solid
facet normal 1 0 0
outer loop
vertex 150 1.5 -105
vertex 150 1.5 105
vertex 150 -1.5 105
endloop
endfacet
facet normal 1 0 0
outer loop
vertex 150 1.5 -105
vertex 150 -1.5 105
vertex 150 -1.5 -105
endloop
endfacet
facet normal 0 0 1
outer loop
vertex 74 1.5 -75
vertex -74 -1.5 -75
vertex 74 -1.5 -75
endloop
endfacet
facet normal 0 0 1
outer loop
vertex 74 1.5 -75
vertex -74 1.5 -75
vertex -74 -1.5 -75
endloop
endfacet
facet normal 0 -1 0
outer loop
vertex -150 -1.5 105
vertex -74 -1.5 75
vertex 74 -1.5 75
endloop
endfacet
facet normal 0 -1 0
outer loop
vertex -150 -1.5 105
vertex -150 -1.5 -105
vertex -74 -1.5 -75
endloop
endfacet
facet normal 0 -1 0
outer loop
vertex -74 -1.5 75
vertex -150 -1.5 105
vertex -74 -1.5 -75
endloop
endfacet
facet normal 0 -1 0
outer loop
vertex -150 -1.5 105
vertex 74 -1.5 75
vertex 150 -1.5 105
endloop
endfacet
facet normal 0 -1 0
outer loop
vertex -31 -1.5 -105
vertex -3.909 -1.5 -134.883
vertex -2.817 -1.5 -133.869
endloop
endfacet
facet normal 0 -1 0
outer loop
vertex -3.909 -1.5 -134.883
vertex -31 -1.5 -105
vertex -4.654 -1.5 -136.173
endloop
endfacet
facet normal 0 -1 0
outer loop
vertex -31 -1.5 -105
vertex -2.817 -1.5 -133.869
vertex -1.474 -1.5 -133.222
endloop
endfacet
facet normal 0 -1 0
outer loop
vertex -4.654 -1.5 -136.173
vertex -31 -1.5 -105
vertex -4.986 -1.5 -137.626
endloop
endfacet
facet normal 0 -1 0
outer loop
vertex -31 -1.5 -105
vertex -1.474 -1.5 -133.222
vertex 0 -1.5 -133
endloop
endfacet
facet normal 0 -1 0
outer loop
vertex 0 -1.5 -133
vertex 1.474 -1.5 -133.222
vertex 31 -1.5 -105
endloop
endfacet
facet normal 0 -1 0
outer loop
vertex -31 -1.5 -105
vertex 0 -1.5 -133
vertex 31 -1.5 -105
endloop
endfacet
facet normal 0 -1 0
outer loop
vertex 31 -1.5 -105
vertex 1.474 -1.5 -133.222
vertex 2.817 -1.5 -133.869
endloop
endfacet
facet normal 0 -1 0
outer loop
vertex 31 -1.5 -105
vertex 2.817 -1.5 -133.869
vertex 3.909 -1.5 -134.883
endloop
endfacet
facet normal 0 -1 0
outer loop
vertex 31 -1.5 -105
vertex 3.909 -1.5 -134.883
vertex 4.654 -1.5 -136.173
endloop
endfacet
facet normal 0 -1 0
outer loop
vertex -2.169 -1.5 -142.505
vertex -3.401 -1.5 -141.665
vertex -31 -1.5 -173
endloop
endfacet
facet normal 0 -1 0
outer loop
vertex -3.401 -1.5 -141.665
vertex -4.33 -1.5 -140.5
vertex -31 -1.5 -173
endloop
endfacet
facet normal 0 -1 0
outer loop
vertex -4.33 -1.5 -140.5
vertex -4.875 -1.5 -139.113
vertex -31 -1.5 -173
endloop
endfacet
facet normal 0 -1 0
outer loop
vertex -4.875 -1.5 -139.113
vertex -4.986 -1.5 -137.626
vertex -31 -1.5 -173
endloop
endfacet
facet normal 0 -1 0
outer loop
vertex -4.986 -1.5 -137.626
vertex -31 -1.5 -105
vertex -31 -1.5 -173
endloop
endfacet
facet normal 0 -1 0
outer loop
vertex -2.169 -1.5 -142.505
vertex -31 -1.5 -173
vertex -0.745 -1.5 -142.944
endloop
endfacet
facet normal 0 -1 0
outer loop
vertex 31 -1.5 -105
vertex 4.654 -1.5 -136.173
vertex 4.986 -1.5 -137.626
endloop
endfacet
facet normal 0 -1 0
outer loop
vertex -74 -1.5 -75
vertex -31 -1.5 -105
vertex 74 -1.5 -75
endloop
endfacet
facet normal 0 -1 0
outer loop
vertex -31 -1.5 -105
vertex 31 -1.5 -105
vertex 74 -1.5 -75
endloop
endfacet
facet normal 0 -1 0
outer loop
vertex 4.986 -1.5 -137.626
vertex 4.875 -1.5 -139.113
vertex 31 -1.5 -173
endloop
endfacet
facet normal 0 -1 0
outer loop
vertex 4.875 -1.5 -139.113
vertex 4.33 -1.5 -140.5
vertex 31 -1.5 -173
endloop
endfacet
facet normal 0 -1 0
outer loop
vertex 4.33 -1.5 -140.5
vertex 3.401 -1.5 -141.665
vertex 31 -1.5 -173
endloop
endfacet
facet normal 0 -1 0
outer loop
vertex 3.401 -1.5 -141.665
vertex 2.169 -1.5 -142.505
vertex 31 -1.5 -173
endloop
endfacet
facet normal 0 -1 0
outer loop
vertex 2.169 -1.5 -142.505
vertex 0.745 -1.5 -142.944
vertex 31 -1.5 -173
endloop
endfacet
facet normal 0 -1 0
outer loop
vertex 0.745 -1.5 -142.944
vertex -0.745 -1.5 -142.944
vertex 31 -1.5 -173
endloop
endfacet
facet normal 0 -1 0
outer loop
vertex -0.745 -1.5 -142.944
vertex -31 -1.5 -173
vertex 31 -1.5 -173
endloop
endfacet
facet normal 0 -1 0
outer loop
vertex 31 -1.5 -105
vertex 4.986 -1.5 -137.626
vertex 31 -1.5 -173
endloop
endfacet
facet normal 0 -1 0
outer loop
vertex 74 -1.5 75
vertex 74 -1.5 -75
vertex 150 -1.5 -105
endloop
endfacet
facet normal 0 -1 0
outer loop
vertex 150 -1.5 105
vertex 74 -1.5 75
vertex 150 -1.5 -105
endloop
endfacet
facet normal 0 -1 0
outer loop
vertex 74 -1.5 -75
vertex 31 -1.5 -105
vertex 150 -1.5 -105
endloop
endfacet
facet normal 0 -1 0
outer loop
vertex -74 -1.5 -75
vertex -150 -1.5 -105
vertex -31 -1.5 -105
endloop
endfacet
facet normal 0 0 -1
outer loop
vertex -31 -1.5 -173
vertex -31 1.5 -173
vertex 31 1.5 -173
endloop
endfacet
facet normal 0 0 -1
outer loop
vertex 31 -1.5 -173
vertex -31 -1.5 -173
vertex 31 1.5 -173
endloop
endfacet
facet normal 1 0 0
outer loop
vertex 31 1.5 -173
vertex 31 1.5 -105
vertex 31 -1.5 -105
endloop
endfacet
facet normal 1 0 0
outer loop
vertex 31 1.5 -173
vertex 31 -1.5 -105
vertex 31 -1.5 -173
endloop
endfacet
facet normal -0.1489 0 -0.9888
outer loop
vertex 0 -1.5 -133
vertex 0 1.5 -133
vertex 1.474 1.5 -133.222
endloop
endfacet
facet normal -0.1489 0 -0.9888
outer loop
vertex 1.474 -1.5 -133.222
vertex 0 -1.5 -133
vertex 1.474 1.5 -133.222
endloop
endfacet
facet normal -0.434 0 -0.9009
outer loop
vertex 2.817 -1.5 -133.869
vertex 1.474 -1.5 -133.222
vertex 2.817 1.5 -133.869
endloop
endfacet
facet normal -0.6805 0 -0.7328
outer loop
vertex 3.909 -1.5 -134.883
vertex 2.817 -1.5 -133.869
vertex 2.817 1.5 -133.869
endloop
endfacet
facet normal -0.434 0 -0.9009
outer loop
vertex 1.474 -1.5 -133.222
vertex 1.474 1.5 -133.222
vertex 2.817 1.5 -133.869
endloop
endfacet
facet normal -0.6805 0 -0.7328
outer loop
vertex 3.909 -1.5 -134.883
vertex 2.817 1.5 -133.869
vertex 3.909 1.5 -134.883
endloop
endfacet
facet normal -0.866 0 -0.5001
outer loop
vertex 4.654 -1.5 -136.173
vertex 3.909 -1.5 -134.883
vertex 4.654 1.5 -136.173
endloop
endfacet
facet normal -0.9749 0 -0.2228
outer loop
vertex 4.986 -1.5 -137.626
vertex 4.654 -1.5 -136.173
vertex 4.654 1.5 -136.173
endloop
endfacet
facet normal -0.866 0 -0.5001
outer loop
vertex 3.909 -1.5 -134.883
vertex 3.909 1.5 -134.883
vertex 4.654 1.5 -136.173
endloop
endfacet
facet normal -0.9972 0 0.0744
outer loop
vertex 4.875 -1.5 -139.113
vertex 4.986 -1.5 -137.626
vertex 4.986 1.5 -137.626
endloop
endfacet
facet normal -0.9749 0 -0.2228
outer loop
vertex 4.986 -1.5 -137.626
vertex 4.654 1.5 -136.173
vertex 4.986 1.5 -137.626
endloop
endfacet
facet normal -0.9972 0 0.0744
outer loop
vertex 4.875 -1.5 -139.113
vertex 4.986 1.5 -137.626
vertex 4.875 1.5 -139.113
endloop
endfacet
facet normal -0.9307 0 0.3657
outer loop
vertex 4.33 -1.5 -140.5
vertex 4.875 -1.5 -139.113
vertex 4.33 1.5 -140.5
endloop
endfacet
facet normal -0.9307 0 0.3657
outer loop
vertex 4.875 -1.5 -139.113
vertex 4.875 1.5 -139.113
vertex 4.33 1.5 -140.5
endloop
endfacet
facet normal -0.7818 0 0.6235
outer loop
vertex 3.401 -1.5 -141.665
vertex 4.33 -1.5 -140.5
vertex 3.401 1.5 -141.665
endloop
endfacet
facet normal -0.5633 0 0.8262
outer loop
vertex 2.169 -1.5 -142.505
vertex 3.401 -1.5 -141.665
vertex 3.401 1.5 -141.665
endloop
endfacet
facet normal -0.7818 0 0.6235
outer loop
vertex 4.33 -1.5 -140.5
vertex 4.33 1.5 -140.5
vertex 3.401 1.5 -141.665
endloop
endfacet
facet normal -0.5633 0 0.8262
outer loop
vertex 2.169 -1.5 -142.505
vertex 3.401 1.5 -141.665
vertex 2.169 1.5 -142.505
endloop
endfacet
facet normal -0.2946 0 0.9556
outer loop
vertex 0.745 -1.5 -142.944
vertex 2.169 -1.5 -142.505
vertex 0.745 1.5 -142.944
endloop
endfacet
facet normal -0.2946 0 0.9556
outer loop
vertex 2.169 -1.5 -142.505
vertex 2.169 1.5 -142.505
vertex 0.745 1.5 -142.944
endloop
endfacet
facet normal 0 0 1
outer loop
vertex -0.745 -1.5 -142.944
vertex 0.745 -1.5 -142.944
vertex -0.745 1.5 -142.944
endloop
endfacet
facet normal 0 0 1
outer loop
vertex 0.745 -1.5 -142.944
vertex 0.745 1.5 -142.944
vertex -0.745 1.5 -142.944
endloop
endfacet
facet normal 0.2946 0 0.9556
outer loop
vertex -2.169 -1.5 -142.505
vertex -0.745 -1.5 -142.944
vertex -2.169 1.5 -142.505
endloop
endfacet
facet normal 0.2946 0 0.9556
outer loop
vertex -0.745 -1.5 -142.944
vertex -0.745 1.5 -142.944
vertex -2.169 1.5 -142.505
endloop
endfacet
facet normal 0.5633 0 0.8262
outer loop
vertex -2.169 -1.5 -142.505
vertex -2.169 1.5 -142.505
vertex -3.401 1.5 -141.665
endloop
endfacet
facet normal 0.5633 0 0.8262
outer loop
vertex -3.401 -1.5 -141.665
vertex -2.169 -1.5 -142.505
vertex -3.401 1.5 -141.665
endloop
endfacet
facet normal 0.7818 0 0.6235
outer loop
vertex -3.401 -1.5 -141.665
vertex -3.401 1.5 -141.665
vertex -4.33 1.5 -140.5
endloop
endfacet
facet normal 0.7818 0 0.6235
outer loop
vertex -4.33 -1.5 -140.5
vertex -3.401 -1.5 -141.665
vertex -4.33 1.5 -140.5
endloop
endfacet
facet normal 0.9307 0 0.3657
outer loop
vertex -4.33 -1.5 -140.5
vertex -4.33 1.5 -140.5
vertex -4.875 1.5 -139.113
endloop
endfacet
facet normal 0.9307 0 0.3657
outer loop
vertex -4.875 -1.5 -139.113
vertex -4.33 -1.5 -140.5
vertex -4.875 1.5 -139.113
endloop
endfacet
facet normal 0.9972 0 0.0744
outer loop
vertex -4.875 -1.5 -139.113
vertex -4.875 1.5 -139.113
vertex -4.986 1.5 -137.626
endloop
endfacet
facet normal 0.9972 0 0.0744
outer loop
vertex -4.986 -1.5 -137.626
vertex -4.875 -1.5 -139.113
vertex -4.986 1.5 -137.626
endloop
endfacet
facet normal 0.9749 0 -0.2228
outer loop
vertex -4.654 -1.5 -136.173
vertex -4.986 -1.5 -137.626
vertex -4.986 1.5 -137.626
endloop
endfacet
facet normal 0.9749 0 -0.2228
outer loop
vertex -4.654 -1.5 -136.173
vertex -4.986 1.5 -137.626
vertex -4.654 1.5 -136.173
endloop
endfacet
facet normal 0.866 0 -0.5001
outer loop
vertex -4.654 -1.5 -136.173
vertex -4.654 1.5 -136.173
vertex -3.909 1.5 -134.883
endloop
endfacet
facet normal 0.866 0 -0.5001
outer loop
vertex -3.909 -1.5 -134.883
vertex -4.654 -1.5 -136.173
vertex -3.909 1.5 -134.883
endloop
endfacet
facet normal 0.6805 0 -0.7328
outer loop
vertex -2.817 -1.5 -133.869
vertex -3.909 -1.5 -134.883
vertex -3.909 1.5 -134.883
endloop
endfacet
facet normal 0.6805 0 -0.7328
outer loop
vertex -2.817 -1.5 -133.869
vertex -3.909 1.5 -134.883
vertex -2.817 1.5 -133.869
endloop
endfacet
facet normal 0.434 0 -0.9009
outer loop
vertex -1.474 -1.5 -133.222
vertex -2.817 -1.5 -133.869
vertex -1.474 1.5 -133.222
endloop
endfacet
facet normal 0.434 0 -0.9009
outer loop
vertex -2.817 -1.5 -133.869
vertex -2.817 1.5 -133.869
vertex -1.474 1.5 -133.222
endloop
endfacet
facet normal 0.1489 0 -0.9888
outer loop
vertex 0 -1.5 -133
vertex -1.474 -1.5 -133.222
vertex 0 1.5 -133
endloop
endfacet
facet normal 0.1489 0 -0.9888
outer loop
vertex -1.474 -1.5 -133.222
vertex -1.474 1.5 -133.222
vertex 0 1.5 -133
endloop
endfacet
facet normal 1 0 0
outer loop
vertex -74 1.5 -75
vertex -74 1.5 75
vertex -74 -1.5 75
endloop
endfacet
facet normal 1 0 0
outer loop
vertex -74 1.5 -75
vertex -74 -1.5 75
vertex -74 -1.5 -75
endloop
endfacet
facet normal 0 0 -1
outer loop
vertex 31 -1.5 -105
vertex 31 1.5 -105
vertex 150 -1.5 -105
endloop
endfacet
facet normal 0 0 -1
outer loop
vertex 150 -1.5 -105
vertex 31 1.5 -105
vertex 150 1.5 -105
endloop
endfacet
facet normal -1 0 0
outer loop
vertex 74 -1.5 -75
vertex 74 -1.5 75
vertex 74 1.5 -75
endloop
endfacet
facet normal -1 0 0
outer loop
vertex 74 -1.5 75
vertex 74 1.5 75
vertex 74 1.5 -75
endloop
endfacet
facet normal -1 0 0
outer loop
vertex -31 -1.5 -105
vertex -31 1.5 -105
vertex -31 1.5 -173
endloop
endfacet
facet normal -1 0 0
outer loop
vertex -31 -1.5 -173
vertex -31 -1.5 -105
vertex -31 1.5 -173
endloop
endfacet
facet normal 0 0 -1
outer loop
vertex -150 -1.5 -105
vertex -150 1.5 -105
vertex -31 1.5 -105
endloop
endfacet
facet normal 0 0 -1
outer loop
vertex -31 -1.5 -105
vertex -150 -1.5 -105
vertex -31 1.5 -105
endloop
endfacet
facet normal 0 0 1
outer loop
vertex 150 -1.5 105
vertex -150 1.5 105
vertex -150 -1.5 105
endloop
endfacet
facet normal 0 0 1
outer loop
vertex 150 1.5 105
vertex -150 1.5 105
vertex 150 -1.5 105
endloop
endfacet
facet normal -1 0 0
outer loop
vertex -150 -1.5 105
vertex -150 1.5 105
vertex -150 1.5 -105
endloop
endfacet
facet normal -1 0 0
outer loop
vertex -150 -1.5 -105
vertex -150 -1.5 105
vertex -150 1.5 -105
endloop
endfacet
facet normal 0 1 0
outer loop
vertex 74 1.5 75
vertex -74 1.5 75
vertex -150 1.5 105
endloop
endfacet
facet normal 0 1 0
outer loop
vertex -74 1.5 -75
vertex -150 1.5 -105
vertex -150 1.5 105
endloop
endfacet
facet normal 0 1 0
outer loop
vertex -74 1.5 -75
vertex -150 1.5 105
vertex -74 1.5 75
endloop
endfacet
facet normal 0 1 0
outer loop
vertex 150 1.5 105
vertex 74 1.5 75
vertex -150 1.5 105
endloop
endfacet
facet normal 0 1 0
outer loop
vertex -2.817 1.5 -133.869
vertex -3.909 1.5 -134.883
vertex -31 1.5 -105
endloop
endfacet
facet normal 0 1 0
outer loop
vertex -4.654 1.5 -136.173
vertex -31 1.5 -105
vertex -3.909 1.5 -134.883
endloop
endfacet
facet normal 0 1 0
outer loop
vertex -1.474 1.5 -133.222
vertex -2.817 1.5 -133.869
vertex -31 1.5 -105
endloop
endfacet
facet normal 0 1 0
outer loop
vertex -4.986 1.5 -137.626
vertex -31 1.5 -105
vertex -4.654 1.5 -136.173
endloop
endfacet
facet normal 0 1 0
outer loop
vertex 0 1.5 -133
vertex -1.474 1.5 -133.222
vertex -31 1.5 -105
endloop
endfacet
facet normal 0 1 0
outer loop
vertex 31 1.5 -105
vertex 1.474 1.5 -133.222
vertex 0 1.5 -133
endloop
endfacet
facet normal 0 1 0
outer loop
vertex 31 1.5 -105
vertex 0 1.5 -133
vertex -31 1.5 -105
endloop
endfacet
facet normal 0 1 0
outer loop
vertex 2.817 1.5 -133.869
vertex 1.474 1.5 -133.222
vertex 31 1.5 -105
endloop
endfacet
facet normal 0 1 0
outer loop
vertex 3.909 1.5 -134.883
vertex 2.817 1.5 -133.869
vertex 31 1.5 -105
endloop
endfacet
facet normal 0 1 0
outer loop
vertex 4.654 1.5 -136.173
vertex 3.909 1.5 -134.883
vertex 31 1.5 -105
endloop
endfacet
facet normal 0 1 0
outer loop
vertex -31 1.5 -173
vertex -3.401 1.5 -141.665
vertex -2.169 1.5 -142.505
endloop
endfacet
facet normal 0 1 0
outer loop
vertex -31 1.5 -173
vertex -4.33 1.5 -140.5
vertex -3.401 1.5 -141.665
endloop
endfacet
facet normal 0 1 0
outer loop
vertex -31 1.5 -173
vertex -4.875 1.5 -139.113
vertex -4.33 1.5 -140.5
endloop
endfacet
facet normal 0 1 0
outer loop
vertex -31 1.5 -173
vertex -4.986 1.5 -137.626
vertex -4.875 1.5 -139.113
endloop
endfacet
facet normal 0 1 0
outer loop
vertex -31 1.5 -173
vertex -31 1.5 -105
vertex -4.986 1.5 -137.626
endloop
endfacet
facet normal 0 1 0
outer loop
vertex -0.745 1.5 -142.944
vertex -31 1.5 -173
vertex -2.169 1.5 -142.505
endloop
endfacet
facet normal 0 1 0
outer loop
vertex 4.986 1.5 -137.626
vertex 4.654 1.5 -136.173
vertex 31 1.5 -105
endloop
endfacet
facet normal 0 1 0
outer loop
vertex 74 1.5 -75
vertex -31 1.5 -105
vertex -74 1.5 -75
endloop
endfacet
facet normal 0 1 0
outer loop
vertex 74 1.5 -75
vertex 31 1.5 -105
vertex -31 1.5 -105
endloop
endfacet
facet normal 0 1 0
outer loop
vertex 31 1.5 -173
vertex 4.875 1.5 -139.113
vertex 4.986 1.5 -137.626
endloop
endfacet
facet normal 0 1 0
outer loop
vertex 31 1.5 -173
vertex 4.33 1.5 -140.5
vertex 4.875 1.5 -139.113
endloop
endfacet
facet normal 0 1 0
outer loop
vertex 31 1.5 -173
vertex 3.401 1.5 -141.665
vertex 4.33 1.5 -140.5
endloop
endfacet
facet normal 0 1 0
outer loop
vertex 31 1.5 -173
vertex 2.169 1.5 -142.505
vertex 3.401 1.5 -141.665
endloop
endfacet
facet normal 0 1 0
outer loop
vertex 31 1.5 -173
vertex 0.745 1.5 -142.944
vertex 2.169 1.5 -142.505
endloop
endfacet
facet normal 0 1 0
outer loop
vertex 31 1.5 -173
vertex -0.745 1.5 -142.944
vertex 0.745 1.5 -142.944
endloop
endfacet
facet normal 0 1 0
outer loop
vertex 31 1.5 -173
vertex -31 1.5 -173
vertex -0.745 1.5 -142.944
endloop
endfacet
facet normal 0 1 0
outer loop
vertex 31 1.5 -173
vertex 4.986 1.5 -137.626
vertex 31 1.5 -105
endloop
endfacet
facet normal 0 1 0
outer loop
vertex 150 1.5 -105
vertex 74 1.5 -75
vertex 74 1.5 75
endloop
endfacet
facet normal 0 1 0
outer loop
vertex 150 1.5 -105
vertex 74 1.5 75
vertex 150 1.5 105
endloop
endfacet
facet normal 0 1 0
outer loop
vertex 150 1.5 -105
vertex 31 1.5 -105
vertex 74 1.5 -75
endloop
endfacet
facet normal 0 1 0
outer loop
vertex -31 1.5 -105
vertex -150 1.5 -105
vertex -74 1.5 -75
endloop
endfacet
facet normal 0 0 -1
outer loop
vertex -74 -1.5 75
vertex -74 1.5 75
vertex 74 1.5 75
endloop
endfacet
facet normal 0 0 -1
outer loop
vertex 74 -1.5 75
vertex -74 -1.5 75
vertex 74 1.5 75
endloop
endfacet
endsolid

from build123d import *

# Parameters (mm, degrees)
SKETCH1_W           = 300
SKETCH1_H           = 210
SKETCH1_W_2         = 148
SKETCH1_H_2         = 150
BOSS_EXTRUDE1_DEPTH = 1.5
SKETCH2_W           = 62
SKETCH2_H           = 68
SKETCH2_R           = 5
BOSS_EXTRUDE2_DEPTH = 3


with BuildPart() as part:
    # Sketch1 → Boss-Extrude1 (new, symmetric)
    with BuildSketch(Plane(origin=(0, 0, 0), x_dir=(1, 0, 0), z_dir=(0, 1, 0))):
        Rectangle(SKETCH1_W, SKETCH1_H)
        Rectangle(SKETCH1_W_2, SKETCH1_H_2, mode=Mode.SUBTRACT)
    extrude(amount=BOSS_EXTRUDE1_DEPTH, both=True)

    # Sketch2 → Boss-Extrude2 (add, through all)
    with BuildSketch(Plane(origin=(0, 1.5, 0), x_dir=(1, 0, 0), z_dir=(0, 1, 0))):
        with Locations((0, 139)):
            Rectangle(SKETCH2_W, SKETCH2_H)
        with Locations(Location((0, 138, 0), (0, 0, 270))):
            Circle(SKETCH2_R, mode=Mode.SUBTRACT)
    extrude(amount=-BOSS_EXTRUDE2_DEPTH)


solid = part.part
